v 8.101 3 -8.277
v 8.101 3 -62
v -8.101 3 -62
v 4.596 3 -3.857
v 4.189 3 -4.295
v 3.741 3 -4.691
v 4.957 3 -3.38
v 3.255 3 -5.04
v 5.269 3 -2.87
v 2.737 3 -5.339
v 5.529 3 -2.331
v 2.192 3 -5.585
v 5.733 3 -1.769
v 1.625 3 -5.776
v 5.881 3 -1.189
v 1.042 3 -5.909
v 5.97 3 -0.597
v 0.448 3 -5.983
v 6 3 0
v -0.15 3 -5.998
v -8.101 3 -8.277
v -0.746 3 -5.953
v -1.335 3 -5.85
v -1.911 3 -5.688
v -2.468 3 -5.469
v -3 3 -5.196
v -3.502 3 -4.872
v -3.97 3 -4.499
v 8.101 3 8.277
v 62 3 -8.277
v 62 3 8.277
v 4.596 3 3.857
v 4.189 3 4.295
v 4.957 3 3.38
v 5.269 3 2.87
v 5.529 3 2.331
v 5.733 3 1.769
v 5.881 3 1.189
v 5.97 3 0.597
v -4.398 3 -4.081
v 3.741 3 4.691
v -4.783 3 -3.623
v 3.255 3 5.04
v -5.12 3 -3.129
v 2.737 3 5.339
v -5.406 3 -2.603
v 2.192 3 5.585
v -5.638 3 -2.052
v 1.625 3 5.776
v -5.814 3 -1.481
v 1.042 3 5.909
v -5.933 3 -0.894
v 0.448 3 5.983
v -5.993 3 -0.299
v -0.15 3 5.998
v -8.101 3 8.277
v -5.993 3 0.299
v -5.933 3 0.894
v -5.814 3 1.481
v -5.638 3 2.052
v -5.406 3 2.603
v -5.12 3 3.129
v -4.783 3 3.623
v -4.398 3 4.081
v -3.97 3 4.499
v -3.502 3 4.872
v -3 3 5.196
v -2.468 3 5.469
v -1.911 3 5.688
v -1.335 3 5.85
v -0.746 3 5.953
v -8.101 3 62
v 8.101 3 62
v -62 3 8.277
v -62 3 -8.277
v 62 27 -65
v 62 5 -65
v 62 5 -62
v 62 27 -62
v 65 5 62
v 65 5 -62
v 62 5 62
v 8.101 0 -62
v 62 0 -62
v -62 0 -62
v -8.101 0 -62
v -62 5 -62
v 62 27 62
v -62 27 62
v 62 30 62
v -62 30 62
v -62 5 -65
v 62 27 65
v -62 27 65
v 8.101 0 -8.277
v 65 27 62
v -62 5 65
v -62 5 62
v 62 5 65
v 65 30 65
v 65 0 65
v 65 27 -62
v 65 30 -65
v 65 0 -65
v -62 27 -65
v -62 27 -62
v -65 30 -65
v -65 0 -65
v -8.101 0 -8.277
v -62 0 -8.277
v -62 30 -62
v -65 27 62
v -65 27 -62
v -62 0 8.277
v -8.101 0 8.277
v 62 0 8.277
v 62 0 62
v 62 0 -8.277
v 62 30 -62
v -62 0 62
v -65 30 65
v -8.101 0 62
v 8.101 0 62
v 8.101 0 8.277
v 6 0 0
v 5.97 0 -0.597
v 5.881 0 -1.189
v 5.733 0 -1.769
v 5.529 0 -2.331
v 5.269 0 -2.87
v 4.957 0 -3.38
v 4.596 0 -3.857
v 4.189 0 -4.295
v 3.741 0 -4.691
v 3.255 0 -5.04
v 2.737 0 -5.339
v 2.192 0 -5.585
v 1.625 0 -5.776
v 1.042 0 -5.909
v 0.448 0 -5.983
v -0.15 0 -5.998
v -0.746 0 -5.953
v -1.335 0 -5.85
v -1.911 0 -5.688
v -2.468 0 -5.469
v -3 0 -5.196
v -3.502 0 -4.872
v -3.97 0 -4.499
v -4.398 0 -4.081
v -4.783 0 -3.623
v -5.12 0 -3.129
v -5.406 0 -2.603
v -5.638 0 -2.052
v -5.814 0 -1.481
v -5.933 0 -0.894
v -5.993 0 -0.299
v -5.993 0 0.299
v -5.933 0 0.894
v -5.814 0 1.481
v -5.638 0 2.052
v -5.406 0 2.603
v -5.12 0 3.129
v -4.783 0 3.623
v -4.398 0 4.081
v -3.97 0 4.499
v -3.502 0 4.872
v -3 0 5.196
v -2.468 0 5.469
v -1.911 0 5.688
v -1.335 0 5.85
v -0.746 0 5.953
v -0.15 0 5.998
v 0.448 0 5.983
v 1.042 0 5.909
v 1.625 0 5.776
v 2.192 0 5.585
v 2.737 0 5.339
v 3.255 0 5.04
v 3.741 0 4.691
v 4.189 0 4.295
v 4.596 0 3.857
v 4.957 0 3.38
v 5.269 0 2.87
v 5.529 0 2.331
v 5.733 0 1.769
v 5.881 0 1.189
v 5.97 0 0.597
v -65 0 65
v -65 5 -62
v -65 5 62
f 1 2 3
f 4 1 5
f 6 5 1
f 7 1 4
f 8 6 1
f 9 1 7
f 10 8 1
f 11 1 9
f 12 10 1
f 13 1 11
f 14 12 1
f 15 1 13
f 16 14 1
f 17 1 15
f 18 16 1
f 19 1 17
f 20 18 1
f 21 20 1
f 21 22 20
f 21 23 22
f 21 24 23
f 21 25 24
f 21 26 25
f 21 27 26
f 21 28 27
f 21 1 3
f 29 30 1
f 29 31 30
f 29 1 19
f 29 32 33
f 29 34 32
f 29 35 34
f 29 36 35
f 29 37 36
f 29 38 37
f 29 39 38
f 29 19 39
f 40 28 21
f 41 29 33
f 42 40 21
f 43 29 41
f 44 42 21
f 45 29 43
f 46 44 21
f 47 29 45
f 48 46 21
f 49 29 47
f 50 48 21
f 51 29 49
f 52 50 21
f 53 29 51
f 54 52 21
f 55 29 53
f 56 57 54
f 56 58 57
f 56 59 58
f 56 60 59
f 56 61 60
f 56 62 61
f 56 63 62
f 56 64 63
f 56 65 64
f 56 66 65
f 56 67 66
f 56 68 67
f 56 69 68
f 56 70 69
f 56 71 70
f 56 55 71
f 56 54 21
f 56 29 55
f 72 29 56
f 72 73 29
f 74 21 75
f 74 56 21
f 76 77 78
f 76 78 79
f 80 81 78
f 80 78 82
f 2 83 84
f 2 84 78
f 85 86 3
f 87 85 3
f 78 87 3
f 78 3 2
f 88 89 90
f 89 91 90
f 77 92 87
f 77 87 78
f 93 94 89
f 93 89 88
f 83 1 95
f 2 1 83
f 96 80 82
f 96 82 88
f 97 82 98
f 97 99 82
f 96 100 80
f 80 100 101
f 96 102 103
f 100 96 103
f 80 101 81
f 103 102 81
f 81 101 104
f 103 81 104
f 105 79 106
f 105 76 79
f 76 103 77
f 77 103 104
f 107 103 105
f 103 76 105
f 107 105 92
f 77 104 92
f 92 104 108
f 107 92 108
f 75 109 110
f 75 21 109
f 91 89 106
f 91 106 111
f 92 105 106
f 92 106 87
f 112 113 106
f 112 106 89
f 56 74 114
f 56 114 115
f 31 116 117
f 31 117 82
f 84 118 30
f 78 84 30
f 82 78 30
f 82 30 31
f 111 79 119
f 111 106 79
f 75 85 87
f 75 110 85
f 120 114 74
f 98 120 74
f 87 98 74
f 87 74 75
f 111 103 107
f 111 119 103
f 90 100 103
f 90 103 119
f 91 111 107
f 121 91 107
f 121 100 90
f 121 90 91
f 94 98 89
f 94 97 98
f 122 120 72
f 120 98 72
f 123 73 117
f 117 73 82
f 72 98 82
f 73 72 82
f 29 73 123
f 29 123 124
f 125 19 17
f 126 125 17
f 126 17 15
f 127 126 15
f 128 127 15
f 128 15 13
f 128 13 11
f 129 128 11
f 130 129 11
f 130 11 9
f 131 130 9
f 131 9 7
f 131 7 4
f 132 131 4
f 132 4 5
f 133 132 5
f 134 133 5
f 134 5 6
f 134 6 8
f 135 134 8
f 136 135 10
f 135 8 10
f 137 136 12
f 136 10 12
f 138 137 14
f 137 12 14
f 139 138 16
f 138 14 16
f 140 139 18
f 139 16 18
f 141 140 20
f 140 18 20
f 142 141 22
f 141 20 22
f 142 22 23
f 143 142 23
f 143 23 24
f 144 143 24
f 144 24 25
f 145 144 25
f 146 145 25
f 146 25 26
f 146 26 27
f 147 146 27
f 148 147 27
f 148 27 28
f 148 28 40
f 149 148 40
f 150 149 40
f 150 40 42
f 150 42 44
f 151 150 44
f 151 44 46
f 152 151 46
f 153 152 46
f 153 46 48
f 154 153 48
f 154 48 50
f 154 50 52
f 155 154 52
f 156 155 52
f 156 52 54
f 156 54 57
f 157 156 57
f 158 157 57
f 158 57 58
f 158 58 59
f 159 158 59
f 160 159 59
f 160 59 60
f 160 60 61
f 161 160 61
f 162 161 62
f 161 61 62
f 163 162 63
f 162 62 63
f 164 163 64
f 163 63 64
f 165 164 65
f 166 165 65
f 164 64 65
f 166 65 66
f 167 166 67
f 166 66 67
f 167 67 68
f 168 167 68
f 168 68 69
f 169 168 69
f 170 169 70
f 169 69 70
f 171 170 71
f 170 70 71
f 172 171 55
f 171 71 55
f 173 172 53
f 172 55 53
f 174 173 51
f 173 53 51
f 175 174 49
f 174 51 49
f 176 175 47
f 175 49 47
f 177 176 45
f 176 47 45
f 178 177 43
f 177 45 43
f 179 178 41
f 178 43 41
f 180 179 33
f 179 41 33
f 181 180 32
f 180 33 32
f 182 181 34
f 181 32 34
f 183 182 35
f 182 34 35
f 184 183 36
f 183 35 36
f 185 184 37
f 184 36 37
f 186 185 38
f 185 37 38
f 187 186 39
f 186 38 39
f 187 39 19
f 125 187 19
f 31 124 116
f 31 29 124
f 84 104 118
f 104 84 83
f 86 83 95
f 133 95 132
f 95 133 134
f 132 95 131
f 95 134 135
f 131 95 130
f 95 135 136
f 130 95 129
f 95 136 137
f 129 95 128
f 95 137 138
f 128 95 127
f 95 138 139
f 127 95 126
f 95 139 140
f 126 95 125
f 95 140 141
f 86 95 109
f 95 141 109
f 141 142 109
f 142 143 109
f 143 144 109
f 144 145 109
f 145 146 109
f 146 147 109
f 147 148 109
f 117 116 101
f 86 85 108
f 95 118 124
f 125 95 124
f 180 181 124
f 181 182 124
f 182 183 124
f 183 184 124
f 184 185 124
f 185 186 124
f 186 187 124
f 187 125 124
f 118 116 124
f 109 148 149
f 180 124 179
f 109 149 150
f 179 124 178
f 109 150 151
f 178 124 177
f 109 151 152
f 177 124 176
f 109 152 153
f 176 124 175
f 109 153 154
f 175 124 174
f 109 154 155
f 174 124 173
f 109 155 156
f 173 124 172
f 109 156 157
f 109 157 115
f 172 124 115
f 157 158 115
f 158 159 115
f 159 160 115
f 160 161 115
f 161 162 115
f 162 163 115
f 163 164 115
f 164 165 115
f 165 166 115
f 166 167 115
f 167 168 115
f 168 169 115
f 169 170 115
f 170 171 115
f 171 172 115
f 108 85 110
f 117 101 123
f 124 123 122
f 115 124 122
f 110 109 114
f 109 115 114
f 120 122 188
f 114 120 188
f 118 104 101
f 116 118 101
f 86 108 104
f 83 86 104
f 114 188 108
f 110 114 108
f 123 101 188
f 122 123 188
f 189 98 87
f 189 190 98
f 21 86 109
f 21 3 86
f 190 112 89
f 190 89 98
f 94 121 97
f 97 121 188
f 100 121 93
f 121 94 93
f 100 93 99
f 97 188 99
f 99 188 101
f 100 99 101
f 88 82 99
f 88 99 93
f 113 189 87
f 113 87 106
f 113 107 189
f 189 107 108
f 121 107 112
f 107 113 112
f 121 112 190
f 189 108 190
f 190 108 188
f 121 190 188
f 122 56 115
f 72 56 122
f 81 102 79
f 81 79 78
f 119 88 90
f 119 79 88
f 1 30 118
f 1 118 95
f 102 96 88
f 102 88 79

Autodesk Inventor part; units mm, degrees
ref_plane "YZ Plane" through (0, 0, 0) normal (1, 0, 0) x (0, 1, 0)
ref_plane "XZ Plane" through (0, 0, 0) normal (0, 1, 0) x (-1, 0, 0)
ref_plane "XY Plane" through (0, 0, 0) normal (0, 0, 1) x (1, 0, 0)
sketch "Sketch1" plane through (0, 0, 0) normal (0, 1, 0) x (-1, 0, 0)
  line L0 (65, 65) -> (-65, 65)
  line L1 (-65, 65) -> (-65, -65)
  line L2 (-65, -65) -> (65, -65)
  line L3 (65, -65) -> (65, 65)
  line L4 (65, 65) -> (-65, -65) construction
  line L5 (-65, 65) -> (65, -65) construction
  point P0 (0, 0)
  dimension "d0" = 130
  dimension "d1" = 130
extrude "Extrusion1" add sketch "Sketch1" along normal blind 30
shell "Shell1" thickness 3 removed faces 1 at (21.6667, 30, -21.6667)
sketch "Sketch2" plane through (-62, 3, -62) normal (0, 1, 0) x (1, 0, 0)
  line L0 (129.611, -53.7228) -> (-3, -53.7228)
  line L1 (-3, -53.7228) -> (-3, -70.2772)
  line L2 (-3, -70.2772) -> (129.611, -70.2772)
  line L3 (129.611, -70.2772) -> (129.611, -53.7228)
  line L4 (53.8994, 0) -> (53.8994, -127.3663)
  line L5 (53.8994, -127.3663) -> (70.1006, -127.3663)
  line L6 (70.1006, -127.3663) -> (70.1006, 0)
  line L7 (70.1006, 0) -> (53.8994, 0)
  line L8 (0, 0) -> (124, 0) projected
  line L9 (-3, 3) -> (-3, -127) projected
  line L10 (124, -124) -> (124, 0) projected
  line L11 (124, 0) -> (0, 0) projected
  line L12 (0, 0) -> (0, -124) projected
  line L13 (0, -124) -> (124, -124) projected
  point P0 (62, -62)
  point P1 (63.6106, -64.6568)
  point P2 (62, 0)
  point P3 (-3, -62)
  point P4 (70.1006, -124)
  point P5 (124, -70.2772)
  point P6 (70.1006, -70.2772)
  point P7 (124, -53.7228)
  point P8 (70.1006, 0)
  point P9 (70.1006, -53.7228)
  point P10 (0, -53.7228)
  point P11 (53.8994, -53.7228)
  point P12 (53.8994, 0)
  point P13 (53.8994, -124)
  point P14 (53.8994, -70.2772)
  point P15 (0, -70.2772)
  dimension "d5" = 16.5545
  dimension "d6" = 16.2012
extrude "Extrusion2" cut sketch "Sketch2" against normal through all contours L0 L6 L8 L10 | L10 L13 L6 L2 | L0 L12 L8 L4 | L4 L13 L12 L2
sketch "Sketch3" plane through (-65, 0, 65) normal (0, 0, 1) x (1, 0, 0)
  line L0 (3, 27) -> (127, 27)
  line L1 (127, 27) -> (127, 5)
  line L2 (127, 5) -> (3, 5)
  line L3 (3, 5) -> (3, 27)
  line L4 (3, 27) -> (127, 5) construction
  line L5 (127, 27) -> (3, 5) construction
  line L6 (0, 0) -> (130, 0) projected
  line L7 (0, 0) -> (0, 30) projected
  line L8 (130, 0) -> (130, 30) projected
  line L9 (0, 30) -> (130, 30) projected
  point P0 (65, 0)
  point P1 (65, 16)
  dimension "d9" = 5
  dimension "d10" = 3
  dimension "d11" = 3
  dimension "d12" = 3
extrude "Extrusion3" cut sketch "Sketch3" against normal blind 25.4 contours L0 L1 L2 L3
sketch "Sketch4" plane through (-62, 3, 65) normal (0, 1, 0) x (1, 0, 0)
  circle A0 centre (62, 65) radius 6
  dimension "d15" = 12
extrude "Extrusion4" cut sketch "Sketch4" against normal blind 25.4
pattern_circular "Circular Pattern1" count 4 over 360 about axis through (0, 3, 0) along (0, -1, 0) of "Extrusion3"
properties part number "Ground Support (Topologi)"
